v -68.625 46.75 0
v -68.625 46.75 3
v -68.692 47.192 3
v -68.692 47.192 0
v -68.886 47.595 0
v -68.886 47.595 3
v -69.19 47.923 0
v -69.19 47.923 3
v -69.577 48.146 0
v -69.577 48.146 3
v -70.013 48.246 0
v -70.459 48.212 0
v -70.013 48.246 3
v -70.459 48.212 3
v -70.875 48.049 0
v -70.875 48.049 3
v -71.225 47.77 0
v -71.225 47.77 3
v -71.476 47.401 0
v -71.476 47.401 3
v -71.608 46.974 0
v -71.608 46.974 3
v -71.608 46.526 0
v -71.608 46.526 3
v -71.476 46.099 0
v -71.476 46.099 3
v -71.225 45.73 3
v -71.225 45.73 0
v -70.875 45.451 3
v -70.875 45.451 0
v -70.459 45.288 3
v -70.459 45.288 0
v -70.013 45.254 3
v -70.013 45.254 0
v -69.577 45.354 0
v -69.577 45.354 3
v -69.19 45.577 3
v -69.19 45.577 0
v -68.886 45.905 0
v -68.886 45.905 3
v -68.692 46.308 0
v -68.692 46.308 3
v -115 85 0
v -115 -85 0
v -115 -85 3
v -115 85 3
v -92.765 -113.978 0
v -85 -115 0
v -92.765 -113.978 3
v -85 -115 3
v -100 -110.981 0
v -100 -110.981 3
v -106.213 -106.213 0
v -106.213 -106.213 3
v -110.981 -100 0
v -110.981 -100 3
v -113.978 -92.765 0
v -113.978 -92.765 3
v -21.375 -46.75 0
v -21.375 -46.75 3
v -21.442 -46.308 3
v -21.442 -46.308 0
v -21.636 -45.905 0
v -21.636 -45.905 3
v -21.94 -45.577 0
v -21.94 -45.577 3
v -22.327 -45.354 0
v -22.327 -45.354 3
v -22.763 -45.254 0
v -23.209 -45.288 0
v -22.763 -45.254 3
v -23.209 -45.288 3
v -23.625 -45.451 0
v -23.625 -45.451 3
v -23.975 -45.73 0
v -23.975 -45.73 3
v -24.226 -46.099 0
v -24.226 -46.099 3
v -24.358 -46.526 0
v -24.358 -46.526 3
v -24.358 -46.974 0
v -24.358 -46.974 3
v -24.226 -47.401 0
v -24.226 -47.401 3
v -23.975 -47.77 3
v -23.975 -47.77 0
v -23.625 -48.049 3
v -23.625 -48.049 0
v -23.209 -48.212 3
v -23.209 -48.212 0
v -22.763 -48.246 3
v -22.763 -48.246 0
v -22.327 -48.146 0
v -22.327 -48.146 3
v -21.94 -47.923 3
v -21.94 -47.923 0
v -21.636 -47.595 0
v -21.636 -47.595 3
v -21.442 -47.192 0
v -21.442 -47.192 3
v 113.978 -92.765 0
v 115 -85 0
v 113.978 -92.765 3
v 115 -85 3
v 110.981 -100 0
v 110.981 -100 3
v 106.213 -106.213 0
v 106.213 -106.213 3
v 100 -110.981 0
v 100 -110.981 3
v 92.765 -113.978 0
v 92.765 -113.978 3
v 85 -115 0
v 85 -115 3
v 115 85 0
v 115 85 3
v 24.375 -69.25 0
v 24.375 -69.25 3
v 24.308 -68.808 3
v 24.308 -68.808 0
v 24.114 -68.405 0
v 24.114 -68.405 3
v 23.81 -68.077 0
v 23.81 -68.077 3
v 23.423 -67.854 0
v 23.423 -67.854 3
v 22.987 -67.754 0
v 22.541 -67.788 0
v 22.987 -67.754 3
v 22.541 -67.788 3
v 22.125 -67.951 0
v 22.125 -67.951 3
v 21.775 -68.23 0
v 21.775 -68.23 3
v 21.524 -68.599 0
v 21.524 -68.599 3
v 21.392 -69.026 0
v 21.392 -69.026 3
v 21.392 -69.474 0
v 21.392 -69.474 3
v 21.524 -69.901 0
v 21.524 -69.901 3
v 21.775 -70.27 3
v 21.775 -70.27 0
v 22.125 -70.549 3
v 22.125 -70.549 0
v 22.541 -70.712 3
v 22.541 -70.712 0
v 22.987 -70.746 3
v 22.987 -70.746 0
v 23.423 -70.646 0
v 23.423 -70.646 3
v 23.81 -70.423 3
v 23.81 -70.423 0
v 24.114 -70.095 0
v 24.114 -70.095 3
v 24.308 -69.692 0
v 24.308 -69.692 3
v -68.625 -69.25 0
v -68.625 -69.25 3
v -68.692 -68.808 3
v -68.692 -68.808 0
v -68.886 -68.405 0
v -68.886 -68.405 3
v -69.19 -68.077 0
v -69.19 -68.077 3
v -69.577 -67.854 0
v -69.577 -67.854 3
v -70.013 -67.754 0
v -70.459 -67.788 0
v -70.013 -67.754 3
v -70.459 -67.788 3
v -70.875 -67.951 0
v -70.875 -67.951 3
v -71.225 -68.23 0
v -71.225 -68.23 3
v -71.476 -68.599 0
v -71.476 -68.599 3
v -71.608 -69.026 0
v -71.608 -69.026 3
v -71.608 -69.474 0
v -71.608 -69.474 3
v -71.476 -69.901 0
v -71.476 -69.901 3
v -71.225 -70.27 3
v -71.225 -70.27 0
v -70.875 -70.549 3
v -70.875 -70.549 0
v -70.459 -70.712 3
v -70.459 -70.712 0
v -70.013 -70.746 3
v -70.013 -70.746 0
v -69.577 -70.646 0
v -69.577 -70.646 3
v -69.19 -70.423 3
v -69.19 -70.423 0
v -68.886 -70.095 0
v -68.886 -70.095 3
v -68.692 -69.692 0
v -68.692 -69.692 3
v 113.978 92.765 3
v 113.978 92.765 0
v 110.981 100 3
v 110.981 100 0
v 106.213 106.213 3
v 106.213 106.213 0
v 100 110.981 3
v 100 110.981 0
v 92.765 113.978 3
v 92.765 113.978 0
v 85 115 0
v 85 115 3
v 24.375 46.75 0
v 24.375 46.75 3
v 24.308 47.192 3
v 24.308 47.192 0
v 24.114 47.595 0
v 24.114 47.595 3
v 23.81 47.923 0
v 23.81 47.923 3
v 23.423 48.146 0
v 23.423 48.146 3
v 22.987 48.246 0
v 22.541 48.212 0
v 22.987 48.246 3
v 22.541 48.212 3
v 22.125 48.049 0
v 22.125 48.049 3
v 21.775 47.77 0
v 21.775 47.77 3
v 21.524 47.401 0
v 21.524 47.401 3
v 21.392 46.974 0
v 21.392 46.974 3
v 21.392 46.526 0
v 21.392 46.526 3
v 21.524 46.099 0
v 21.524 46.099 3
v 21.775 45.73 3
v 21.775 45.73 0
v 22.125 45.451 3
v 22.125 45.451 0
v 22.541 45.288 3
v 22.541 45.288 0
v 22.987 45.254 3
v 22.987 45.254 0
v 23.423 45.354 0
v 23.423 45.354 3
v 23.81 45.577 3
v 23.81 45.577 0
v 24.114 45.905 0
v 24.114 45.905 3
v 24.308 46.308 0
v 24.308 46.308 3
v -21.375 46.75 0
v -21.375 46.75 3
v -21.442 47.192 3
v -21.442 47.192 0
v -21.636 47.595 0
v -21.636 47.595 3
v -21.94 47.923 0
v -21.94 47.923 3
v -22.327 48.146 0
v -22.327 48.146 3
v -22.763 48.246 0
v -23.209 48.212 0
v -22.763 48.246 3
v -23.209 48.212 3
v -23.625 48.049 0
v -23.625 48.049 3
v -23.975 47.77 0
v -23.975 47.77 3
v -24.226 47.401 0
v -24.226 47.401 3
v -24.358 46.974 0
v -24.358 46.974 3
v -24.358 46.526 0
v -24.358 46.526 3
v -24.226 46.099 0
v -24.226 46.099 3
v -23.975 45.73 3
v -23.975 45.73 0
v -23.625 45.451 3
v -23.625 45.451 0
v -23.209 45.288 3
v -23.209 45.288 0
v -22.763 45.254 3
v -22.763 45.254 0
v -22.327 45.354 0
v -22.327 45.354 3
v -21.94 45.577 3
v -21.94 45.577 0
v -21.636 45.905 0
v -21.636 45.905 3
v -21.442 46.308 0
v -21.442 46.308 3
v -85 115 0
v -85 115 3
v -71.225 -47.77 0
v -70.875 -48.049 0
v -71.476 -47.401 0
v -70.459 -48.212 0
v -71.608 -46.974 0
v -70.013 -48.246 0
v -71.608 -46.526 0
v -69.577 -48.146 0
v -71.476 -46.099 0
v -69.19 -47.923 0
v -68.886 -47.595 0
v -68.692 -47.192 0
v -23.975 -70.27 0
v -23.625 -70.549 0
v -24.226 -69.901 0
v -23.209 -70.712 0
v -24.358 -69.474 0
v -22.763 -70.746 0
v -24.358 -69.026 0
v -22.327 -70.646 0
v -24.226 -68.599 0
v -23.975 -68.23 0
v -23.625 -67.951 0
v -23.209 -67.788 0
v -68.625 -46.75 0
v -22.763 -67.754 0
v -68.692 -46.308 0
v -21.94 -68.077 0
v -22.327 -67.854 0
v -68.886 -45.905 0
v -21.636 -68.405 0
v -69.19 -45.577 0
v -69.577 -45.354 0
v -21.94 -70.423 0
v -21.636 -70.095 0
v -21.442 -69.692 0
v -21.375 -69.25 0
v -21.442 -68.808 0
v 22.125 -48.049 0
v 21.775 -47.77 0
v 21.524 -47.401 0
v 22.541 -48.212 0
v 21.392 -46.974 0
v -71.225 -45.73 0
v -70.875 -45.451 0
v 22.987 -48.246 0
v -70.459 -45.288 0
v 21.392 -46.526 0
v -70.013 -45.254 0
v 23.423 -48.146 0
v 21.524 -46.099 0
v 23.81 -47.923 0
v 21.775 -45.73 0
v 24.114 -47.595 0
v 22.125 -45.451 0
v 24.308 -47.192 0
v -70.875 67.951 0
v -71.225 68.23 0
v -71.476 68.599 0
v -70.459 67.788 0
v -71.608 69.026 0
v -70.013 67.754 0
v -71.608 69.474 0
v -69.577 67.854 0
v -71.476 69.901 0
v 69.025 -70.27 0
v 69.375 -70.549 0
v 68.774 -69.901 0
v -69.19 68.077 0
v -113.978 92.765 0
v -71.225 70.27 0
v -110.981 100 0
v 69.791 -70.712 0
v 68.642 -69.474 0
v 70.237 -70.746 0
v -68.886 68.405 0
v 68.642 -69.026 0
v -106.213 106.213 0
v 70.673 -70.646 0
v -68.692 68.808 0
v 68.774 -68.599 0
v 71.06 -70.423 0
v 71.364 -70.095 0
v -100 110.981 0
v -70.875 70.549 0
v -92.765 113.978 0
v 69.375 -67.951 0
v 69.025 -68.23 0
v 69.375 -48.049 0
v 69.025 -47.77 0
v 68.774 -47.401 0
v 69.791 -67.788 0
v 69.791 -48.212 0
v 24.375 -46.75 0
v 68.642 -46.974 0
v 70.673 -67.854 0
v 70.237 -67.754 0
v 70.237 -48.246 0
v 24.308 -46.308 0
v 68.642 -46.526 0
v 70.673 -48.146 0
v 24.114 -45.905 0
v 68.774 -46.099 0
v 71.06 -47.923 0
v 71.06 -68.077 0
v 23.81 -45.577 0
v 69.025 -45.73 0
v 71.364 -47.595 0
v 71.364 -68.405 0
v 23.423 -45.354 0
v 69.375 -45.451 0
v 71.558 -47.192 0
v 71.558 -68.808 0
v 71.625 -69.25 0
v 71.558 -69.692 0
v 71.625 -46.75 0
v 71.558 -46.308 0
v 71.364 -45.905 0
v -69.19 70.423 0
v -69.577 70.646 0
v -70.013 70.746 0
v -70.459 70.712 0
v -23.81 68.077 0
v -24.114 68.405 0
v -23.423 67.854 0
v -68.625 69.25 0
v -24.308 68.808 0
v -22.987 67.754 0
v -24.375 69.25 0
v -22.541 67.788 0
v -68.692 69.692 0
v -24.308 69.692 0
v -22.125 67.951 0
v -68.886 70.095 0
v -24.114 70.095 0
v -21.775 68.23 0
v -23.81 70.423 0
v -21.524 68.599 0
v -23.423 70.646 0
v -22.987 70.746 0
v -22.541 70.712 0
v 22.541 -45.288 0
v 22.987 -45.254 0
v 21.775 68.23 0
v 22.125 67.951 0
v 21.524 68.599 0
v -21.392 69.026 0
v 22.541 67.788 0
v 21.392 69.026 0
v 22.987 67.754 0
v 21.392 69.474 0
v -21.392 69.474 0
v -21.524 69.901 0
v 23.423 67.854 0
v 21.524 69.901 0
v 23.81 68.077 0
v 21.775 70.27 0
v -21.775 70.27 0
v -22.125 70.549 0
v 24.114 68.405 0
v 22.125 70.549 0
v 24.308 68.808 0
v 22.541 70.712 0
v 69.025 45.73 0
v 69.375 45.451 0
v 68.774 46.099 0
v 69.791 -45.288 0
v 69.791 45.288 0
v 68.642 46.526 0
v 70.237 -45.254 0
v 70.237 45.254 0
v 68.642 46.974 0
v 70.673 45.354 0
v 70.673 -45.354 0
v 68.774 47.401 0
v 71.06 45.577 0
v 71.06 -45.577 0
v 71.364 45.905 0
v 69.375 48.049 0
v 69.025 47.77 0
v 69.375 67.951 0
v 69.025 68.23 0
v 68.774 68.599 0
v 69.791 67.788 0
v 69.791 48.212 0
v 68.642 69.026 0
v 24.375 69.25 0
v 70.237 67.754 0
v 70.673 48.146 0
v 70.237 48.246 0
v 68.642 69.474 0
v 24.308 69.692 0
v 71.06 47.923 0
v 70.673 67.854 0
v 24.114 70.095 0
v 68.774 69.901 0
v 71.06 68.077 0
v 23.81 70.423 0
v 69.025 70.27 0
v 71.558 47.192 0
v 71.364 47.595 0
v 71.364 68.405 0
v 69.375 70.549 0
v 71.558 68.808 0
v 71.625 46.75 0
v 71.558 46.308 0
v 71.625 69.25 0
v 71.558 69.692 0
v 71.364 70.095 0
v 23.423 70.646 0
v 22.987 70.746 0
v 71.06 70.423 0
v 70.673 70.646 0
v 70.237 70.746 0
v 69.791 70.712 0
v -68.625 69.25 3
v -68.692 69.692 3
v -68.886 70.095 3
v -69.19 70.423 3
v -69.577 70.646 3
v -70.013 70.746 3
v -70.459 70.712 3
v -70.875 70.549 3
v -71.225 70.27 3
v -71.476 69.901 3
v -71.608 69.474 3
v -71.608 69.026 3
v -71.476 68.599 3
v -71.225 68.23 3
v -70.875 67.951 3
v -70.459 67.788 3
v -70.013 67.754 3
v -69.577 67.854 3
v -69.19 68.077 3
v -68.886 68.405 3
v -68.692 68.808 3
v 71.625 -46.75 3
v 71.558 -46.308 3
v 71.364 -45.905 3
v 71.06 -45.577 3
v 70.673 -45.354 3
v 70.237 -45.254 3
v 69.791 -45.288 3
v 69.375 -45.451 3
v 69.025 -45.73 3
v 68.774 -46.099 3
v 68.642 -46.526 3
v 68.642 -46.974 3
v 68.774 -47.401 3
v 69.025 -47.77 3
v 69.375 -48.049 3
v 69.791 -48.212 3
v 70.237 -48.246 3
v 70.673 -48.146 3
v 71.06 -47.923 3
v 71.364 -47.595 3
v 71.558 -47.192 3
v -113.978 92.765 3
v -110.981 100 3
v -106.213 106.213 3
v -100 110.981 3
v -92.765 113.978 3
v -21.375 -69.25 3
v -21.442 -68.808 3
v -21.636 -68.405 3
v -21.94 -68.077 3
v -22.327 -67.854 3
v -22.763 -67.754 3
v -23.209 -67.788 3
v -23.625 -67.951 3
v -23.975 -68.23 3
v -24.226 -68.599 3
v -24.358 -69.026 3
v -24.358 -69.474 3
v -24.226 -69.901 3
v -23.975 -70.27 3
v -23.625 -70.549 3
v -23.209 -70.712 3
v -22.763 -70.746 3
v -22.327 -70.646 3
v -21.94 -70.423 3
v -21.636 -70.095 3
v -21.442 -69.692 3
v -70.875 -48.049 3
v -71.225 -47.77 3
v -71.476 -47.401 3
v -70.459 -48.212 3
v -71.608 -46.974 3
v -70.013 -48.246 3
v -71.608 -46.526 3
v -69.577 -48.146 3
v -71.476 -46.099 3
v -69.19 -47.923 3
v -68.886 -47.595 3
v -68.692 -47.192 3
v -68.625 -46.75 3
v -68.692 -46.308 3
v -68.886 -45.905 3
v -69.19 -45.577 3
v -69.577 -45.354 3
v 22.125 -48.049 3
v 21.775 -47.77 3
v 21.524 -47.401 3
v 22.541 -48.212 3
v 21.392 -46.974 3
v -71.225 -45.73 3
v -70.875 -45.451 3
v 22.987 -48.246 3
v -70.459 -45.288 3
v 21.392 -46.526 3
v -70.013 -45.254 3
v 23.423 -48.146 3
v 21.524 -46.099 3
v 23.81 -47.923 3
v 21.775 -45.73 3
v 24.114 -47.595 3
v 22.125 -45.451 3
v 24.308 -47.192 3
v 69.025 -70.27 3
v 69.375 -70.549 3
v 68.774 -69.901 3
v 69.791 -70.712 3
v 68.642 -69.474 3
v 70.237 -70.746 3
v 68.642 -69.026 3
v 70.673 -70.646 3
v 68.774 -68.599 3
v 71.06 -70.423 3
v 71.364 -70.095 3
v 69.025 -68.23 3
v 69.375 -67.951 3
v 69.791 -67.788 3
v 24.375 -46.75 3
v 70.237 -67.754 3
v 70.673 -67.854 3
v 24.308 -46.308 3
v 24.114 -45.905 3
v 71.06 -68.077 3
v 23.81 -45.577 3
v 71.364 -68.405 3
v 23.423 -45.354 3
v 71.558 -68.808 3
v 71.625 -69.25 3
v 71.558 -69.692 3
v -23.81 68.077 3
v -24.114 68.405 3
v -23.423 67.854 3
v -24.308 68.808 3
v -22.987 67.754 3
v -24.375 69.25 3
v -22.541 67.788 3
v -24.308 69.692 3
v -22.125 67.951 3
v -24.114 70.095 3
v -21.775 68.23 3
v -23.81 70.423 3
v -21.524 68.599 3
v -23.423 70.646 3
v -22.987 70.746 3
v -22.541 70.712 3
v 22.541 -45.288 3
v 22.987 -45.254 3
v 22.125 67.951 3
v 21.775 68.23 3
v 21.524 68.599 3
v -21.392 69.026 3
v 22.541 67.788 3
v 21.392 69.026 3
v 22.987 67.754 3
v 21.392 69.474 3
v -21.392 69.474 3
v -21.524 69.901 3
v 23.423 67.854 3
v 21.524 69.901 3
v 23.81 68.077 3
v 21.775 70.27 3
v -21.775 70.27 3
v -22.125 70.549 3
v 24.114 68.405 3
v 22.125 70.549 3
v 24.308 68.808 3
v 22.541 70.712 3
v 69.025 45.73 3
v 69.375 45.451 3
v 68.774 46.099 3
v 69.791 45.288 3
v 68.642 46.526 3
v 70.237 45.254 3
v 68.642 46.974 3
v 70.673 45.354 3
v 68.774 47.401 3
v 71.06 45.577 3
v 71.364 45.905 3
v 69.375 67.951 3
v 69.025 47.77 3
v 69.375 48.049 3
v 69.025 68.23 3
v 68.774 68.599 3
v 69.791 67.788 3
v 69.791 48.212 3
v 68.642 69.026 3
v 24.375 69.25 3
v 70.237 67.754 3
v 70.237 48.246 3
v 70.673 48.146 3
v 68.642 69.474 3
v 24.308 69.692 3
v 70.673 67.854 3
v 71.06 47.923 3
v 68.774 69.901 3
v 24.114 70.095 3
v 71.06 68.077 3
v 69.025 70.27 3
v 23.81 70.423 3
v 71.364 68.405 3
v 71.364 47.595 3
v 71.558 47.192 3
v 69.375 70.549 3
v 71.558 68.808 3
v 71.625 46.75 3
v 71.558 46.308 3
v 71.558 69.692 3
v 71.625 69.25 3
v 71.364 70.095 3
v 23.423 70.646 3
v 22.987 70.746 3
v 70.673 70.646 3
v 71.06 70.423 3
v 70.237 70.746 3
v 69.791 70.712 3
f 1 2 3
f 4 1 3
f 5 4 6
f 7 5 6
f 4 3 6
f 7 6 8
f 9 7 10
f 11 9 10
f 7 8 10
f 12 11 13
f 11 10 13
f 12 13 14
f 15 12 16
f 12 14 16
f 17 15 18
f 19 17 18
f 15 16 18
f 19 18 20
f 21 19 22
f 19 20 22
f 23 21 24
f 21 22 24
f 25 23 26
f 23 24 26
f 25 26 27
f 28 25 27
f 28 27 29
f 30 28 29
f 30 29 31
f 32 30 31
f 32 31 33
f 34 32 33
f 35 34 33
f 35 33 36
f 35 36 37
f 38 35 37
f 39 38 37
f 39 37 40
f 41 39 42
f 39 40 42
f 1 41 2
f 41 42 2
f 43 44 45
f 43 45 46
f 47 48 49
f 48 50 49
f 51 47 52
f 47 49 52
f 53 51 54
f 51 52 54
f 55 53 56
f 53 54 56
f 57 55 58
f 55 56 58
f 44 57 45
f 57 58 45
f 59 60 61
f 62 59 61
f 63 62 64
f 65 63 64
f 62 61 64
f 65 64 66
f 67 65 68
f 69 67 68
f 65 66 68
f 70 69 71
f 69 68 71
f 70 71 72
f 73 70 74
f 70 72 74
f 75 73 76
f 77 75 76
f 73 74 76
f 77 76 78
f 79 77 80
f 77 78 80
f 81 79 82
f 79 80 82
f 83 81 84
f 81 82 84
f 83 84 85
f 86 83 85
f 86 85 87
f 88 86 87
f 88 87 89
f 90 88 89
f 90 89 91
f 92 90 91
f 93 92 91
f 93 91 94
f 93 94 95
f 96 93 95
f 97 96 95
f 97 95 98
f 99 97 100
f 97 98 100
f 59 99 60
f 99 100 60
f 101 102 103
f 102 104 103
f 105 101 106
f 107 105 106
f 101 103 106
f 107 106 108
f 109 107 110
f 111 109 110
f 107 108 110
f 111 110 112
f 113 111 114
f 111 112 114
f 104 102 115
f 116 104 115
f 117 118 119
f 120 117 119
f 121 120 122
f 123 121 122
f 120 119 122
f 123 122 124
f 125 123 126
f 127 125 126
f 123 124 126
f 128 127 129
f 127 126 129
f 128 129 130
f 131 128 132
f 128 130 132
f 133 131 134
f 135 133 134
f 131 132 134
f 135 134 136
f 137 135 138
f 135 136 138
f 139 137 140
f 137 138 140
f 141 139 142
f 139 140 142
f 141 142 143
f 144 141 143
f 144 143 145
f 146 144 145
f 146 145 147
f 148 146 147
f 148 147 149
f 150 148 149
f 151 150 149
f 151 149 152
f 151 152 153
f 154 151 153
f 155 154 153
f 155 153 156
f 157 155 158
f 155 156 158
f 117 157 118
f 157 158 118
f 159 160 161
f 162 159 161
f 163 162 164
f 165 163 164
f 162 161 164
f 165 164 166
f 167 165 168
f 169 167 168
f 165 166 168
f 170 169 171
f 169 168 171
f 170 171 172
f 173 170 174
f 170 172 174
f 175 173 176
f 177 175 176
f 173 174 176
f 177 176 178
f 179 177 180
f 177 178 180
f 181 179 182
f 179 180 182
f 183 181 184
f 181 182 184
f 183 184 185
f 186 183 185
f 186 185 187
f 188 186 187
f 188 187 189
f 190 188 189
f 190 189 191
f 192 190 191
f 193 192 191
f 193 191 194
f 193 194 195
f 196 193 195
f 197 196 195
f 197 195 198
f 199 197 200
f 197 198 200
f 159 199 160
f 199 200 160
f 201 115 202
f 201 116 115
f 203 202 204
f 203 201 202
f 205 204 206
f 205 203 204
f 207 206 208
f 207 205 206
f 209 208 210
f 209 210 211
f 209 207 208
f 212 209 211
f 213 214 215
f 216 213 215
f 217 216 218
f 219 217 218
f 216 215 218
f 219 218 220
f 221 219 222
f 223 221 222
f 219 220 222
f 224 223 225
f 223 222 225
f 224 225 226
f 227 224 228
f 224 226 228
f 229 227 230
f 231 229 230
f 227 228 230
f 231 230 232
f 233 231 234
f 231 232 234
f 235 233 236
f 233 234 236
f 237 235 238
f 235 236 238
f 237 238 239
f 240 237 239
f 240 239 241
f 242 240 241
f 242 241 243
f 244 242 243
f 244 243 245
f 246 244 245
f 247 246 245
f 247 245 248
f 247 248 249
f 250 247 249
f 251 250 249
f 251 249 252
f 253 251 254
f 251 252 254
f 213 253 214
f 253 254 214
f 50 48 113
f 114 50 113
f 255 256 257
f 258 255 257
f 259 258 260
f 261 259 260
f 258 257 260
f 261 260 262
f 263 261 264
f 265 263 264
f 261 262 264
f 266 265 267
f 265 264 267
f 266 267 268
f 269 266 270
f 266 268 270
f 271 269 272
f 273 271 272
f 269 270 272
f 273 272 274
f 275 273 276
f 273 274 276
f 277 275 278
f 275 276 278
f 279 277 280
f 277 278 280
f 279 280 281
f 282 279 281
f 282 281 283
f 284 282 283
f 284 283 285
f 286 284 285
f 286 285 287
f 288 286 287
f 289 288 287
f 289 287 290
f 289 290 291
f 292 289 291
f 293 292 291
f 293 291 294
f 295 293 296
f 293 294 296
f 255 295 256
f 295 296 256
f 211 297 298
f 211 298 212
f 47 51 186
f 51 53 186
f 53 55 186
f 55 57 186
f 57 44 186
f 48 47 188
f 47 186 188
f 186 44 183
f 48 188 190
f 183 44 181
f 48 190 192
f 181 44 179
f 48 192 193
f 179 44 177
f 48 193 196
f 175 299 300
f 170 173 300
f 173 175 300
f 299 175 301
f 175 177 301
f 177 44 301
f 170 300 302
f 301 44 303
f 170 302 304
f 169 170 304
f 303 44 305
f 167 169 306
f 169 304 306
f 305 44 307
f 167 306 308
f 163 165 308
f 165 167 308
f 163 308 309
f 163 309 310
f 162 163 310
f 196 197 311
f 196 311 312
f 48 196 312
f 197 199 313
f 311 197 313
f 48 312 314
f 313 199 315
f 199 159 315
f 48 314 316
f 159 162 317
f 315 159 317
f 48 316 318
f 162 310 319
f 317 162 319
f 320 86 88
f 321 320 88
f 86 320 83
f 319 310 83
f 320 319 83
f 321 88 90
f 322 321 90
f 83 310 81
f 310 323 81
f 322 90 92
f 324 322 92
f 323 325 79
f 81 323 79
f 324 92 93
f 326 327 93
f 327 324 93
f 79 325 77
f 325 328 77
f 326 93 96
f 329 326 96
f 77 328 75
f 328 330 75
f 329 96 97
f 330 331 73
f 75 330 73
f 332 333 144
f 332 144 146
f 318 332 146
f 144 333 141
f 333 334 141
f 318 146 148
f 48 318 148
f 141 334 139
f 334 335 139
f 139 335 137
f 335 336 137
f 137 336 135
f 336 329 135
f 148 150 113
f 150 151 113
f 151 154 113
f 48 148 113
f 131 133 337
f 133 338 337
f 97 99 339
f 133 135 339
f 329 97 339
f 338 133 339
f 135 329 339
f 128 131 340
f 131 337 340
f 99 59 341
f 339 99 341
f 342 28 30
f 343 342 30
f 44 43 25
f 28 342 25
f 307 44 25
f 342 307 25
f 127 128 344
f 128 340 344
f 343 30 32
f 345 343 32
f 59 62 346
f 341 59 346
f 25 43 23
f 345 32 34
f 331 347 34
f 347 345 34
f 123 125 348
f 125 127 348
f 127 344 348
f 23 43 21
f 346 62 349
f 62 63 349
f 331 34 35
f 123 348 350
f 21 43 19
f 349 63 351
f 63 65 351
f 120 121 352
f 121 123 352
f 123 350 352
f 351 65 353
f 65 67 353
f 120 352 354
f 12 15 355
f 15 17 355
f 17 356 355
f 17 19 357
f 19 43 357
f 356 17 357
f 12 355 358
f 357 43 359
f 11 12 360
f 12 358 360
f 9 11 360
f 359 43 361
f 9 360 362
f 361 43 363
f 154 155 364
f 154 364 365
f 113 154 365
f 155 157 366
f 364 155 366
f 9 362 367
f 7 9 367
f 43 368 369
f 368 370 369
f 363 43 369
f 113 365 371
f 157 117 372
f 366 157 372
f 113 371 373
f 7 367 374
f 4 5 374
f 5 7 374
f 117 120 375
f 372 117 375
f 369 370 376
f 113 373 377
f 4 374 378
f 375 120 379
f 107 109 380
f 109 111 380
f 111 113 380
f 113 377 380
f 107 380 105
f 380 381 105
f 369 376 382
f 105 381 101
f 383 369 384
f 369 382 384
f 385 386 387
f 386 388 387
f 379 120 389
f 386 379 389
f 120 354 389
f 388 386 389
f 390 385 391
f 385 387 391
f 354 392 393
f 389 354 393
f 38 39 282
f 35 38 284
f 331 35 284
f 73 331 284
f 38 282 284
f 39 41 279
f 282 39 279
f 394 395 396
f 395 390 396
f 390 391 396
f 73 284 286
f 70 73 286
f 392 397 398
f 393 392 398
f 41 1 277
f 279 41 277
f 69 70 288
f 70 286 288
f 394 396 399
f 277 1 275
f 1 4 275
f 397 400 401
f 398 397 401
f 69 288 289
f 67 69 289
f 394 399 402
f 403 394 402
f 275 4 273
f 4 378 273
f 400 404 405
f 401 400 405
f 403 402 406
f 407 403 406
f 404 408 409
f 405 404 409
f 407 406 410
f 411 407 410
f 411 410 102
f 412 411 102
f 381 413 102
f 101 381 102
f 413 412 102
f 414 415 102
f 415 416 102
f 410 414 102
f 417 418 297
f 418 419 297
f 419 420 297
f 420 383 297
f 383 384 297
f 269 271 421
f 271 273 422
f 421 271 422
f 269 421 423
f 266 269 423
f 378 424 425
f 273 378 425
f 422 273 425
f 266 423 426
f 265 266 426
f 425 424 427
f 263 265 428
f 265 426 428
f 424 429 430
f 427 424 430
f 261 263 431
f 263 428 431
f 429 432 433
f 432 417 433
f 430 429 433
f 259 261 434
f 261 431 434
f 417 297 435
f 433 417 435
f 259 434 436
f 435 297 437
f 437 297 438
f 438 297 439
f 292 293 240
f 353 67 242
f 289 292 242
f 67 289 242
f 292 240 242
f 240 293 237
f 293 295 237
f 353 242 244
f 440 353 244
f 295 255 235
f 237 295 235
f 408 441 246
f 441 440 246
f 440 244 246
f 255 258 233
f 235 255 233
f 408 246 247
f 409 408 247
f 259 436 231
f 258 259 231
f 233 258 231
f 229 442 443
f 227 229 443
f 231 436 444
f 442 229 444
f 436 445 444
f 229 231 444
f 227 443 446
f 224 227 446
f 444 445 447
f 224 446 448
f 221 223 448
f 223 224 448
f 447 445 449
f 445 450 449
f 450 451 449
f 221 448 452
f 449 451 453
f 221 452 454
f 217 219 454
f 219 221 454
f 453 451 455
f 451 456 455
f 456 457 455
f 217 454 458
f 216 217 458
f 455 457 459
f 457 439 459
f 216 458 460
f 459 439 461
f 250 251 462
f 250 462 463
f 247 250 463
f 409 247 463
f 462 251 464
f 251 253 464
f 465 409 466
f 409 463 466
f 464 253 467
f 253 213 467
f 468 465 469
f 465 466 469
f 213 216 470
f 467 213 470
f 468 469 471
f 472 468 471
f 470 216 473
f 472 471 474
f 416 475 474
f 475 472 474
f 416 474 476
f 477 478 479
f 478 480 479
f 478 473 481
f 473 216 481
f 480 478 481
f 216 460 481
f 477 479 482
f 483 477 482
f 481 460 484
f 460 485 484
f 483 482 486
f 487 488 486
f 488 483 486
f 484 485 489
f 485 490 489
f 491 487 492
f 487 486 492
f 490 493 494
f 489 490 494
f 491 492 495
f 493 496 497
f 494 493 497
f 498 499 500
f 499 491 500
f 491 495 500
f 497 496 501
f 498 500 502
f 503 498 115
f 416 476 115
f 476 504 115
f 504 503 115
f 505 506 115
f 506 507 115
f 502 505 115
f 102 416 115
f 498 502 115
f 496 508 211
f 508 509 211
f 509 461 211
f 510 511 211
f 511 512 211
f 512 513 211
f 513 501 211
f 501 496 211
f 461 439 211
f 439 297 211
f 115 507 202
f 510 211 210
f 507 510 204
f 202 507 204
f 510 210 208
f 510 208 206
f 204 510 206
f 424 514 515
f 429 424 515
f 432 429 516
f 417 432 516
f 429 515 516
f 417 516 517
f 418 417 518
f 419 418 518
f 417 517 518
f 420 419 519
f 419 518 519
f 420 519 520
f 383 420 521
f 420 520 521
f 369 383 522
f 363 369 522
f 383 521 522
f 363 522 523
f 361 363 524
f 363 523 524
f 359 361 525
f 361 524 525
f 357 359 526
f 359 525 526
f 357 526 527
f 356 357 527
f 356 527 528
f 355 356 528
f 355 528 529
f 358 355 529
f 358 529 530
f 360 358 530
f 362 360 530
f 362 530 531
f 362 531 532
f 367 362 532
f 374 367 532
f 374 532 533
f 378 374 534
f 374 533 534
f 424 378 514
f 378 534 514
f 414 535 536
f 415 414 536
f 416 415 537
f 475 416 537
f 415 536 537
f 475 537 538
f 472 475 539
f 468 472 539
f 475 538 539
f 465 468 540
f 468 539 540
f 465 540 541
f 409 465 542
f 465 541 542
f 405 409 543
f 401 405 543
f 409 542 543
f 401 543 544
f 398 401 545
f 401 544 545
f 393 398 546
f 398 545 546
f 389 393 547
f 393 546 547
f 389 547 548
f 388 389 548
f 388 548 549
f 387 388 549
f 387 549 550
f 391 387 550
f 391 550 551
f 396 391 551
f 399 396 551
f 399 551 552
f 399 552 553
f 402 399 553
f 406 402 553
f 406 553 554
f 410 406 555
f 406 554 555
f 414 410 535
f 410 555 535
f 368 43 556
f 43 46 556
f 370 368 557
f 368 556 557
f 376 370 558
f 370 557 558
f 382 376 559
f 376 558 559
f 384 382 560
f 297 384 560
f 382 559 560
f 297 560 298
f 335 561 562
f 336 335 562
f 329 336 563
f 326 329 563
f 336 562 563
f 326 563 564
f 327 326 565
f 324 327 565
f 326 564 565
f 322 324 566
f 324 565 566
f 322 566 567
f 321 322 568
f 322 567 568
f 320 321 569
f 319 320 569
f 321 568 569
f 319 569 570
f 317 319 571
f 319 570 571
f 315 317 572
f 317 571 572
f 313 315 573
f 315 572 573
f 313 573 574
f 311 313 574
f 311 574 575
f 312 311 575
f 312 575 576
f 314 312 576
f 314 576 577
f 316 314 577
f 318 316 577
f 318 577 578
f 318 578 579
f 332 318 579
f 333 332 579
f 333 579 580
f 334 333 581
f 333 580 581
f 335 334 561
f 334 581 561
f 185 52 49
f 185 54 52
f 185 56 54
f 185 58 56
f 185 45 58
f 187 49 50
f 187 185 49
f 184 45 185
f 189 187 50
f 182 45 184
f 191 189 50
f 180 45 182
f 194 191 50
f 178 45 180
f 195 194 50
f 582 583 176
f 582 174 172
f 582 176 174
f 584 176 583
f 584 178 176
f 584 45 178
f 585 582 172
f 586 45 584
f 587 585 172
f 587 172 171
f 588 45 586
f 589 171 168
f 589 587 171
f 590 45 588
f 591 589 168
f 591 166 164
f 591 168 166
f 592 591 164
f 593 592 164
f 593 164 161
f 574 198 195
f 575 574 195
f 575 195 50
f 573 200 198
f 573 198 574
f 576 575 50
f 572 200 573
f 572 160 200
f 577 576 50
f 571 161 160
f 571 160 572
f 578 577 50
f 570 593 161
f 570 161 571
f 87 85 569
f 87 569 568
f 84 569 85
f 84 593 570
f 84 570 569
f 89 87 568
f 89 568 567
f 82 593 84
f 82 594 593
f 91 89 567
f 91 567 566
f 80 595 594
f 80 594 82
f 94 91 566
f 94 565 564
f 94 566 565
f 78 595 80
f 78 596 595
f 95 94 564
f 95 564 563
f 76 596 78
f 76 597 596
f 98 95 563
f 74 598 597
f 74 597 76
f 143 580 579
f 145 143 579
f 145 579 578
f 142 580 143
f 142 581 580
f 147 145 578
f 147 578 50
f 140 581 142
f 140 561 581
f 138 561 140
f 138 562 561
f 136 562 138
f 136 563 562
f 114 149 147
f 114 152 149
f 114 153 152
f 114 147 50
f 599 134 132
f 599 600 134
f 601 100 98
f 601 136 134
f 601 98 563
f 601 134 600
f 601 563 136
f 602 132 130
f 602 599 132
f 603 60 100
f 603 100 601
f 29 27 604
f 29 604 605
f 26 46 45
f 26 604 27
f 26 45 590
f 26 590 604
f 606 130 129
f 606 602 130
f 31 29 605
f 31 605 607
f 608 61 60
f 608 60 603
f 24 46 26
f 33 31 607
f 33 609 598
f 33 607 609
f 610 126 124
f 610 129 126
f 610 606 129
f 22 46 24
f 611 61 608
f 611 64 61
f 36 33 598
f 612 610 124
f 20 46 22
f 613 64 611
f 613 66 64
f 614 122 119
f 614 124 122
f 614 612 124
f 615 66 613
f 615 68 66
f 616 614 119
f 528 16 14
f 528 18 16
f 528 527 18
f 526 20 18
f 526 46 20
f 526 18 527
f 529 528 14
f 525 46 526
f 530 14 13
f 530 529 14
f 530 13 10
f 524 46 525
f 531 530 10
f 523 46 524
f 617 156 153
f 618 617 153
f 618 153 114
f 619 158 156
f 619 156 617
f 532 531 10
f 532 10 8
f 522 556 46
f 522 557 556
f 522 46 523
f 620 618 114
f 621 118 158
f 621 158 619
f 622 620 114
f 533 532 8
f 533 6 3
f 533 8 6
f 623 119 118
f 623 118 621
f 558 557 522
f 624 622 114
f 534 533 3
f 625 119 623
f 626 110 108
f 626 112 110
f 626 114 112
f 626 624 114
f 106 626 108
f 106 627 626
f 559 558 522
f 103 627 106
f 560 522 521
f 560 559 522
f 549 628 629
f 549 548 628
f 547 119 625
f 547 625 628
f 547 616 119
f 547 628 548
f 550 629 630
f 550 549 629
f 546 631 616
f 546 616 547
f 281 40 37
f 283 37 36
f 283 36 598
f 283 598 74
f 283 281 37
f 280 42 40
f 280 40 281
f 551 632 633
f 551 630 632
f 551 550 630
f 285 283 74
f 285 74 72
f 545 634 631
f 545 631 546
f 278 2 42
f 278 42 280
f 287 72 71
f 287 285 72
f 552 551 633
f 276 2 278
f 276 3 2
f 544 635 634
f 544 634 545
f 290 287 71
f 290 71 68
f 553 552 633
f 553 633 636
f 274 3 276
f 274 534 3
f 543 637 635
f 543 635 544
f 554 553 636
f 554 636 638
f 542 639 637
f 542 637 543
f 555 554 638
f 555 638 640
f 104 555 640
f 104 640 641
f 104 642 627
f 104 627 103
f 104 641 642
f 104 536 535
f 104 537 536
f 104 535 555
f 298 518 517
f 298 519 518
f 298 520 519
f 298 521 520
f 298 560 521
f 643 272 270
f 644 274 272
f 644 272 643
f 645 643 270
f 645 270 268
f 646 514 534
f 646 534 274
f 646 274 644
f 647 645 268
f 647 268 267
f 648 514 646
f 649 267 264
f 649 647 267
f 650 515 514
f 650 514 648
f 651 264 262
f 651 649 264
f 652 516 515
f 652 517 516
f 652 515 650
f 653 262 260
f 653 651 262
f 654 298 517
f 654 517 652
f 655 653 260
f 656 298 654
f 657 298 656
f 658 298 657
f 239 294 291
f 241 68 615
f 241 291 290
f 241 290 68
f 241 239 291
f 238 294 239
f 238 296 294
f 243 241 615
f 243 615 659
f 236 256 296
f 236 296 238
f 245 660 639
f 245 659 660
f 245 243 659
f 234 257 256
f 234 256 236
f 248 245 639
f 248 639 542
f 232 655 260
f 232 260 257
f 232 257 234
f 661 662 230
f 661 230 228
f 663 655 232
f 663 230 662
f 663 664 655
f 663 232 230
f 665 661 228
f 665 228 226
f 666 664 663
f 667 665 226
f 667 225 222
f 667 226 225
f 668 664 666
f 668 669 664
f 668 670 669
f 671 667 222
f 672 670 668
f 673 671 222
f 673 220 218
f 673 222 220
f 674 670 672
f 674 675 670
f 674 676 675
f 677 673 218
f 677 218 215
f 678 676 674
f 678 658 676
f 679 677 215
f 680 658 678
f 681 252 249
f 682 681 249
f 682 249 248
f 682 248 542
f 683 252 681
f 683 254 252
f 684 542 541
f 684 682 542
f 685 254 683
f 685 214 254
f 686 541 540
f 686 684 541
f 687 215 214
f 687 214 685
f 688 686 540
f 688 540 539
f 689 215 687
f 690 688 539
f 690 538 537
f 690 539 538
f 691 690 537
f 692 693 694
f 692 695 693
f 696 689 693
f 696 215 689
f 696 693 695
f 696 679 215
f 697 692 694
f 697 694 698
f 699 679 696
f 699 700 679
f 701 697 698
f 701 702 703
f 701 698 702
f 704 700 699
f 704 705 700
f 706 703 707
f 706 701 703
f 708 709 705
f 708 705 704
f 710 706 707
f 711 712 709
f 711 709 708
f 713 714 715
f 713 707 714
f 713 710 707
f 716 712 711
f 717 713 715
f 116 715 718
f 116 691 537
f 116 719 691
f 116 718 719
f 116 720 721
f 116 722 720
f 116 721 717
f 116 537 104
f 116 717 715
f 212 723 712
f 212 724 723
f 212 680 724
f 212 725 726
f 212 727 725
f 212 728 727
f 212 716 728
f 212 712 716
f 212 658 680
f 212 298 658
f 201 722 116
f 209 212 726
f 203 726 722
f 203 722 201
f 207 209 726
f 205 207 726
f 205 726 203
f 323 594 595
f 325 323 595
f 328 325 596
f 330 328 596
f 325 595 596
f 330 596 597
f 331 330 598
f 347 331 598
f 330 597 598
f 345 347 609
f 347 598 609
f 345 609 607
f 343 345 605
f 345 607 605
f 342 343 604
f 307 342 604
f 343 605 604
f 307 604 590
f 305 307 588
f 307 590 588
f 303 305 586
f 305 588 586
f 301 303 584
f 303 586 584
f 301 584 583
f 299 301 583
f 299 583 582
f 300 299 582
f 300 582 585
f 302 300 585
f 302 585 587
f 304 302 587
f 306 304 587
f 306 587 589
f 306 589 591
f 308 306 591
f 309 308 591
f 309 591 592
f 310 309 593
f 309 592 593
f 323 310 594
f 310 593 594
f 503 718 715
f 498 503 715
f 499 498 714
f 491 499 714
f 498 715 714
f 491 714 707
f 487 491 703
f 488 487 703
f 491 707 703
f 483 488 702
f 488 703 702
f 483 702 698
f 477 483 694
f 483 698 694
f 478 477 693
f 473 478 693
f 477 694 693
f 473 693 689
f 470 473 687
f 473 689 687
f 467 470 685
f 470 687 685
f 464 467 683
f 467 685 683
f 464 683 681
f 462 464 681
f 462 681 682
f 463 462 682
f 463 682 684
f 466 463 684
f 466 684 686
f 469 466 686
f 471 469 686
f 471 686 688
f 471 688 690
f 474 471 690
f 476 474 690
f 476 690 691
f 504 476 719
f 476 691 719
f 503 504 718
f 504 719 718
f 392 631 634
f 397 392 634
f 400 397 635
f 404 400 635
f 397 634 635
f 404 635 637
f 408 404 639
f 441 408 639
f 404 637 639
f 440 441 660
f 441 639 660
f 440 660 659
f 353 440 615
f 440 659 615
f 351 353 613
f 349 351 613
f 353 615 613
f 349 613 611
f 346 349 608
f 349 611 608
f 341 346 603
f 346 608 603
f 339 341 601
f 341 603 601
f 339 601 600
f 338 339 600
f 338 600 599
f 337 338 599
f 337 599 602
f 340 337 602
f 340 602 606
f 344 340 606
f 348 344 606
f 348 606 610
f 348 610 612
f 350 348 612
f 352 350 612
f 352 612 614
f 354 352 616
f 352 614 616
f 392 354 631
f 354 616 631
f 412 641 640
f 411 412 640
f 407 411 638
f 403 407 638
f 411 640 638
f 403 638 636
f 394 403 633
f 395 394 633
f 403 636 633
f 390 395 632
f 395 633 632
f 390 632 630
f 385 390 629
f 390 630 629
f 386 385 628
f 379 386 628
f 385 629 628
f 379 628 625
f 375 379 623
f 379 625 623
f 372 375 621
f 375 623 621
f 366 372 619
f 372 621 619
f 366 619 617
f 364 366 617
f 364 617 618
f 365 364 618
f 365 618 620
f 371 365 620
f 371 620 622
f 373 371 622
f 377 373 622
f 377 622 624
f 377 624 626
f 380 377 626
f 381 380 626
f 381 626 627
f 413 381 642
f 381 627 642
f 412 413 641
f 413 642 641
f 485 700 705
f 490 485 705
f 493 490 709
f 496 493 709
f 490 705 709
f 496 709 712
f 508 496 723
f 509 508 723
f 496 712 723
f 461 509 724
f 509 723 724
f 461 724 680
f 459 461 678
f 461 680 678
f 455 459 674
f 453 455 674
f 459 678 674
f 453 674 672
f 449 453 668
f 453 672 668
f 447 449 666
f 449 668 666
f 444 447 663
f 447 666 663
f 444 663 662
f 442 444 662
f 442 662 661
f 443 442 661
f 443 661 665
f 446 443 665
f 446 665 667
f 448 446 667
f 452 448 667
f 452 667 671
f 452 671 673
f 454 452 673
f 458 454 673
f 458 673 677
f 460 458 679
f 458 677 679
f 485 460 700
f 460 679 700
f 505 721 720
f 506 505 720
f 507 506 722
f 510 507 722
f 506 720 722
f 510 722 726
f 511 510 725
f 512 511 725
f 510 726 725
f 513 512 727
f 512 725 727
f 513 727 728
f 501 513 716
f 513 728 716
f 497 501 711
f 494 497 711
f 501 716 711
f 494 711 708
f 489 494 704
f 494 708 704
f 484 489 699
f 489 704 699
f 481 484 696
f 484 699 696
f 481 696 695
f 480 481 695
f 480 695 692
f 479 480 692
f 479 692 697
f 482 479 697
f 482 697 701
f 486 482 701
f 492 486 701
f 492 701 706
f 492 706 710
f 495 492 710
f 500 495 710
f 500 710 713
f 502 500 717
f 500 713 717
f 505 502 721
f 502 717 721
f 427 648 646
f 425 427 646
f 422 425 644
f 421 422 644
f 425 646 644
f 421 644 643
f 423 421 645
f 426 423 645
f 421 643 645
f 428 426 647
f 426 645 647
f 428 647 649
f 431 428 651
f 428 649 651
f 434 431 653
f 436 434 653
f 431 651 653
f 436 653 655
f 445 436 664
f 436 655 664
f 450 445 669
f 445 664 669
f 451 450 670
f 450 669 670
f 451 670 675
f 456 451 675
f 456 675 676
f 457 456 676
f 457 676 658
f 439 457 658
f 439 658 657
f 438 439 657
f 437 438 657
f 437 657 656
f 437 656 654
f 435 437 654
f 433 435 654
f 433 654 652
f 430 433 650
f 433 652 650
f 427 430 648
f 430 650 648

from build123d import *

# Parameters (mm, degrees)
CROQUIS1_W              = 230
CROQUIS1_H              = 230
SALIENTE_EXTRUIR1_DEPTH = 3
REDONDEO1_R             = 30
REDONDEO2_R             = 30
REDONDEO3_R             = 30
REDONDEO4_R             = 30
CROQUIS2_R              = 1.5
CORTAR_EXTRUIR1_DEPTH   = 3


with BuildPart() as part:
    # Croquis1 → Saliente-Extruir1 (new body)
    with BuildSketch(Plane.XY):
        Rectangle(CROQUIS1_W, CROQUIS1_H)
    extrude(amount=SALIENTE_EXTRUIR1_DEPTH)

    # Redondeo1
    redondeo1_edges = [part.edges().sort_by_distance(p)[0] for p in [
        (115, 115, 1.5),
    ]]
    fillet(redondeo1_edges, radius=REDONDEO1_R)

    # Redondeo2
    redondeo2_edges = [part.edges().sort_by_distance(p)[0] for p in [
        (115, -115, 1.5),
    ]]
    fillet(redondeo2_edges, radius=REDONDEO2_R)

    # Redondeo3
    redondeo3_edges = [part.edges().sort_by_distance(p)[0] for p in [
        (-115, -115, 1.5),
    ]]
    fillet(redondeo3_edges, radius=REDONDEO3_R)

    # Redondeo4
    redondeo4_edges = [part.edges().sort_by_distance(p)[0] for p in [
        (-115, 115, 1.5),
    ]]
    fillet(redondeo4_edges, radius=REDONDEO4_R)

    # Croquis2 → Cortar-Extruir1 (cut)
    with BuildSketch(Plane.XY.offset(3)):
        with Locations((-70.125, 69.25)):
            Circle(CROQUIS2_R)
        with Locations((-70.125, 46.75)):
            Circle(CROQUIS2_R)
        with Locations((-22.875, 46.75)):
            Circle(CROQUIS2_R)
        with Locations((22.875, 69.25)):
            Circle(CROQUIS2_R)
        with Locations((22.875, 46.75)):
            Circle(CROQUIS2_R)
        with Locations((70.125, 46.75)):
            Circle(CROQUIS2_R)
        with Locations((70.125, 69.25)):
            Circle(CROQUIS2_R)
        with Locations((70.125, -69.25)):
            Circle(CROQUIS2_R)
        with Locations((70.125, -46.75)):
            Circle(CROQUIS2_R)
        with Locations((22.875, -46.75)):
            Circle(CROQUIS2_R)
        with Locations((22.875, -69.25)):
            Circle(CROQUIS2_R)
        with Locations((-22.875, -69.25)):
            Circle(CROQUIS2_R)
        with Locations((-70.125, -69.25)):
            Circle(CROQUIS2_R)
        with Locations((-70.125, -46.75)):
            Circle(CROQUIS2_R)
        with Locations((-22.875, -46.75)):
            Circle(CROQUIS2_R)
        with Locations(Location((-22.875, 69.25, 0), (0, 0, 180))):
            Circle(CROQUIS2_R)
    extrude(amount=-CORTAR_EXTRUIR1_DEPTH, mode=Mode.SUBTRACT)


solid = part.part
